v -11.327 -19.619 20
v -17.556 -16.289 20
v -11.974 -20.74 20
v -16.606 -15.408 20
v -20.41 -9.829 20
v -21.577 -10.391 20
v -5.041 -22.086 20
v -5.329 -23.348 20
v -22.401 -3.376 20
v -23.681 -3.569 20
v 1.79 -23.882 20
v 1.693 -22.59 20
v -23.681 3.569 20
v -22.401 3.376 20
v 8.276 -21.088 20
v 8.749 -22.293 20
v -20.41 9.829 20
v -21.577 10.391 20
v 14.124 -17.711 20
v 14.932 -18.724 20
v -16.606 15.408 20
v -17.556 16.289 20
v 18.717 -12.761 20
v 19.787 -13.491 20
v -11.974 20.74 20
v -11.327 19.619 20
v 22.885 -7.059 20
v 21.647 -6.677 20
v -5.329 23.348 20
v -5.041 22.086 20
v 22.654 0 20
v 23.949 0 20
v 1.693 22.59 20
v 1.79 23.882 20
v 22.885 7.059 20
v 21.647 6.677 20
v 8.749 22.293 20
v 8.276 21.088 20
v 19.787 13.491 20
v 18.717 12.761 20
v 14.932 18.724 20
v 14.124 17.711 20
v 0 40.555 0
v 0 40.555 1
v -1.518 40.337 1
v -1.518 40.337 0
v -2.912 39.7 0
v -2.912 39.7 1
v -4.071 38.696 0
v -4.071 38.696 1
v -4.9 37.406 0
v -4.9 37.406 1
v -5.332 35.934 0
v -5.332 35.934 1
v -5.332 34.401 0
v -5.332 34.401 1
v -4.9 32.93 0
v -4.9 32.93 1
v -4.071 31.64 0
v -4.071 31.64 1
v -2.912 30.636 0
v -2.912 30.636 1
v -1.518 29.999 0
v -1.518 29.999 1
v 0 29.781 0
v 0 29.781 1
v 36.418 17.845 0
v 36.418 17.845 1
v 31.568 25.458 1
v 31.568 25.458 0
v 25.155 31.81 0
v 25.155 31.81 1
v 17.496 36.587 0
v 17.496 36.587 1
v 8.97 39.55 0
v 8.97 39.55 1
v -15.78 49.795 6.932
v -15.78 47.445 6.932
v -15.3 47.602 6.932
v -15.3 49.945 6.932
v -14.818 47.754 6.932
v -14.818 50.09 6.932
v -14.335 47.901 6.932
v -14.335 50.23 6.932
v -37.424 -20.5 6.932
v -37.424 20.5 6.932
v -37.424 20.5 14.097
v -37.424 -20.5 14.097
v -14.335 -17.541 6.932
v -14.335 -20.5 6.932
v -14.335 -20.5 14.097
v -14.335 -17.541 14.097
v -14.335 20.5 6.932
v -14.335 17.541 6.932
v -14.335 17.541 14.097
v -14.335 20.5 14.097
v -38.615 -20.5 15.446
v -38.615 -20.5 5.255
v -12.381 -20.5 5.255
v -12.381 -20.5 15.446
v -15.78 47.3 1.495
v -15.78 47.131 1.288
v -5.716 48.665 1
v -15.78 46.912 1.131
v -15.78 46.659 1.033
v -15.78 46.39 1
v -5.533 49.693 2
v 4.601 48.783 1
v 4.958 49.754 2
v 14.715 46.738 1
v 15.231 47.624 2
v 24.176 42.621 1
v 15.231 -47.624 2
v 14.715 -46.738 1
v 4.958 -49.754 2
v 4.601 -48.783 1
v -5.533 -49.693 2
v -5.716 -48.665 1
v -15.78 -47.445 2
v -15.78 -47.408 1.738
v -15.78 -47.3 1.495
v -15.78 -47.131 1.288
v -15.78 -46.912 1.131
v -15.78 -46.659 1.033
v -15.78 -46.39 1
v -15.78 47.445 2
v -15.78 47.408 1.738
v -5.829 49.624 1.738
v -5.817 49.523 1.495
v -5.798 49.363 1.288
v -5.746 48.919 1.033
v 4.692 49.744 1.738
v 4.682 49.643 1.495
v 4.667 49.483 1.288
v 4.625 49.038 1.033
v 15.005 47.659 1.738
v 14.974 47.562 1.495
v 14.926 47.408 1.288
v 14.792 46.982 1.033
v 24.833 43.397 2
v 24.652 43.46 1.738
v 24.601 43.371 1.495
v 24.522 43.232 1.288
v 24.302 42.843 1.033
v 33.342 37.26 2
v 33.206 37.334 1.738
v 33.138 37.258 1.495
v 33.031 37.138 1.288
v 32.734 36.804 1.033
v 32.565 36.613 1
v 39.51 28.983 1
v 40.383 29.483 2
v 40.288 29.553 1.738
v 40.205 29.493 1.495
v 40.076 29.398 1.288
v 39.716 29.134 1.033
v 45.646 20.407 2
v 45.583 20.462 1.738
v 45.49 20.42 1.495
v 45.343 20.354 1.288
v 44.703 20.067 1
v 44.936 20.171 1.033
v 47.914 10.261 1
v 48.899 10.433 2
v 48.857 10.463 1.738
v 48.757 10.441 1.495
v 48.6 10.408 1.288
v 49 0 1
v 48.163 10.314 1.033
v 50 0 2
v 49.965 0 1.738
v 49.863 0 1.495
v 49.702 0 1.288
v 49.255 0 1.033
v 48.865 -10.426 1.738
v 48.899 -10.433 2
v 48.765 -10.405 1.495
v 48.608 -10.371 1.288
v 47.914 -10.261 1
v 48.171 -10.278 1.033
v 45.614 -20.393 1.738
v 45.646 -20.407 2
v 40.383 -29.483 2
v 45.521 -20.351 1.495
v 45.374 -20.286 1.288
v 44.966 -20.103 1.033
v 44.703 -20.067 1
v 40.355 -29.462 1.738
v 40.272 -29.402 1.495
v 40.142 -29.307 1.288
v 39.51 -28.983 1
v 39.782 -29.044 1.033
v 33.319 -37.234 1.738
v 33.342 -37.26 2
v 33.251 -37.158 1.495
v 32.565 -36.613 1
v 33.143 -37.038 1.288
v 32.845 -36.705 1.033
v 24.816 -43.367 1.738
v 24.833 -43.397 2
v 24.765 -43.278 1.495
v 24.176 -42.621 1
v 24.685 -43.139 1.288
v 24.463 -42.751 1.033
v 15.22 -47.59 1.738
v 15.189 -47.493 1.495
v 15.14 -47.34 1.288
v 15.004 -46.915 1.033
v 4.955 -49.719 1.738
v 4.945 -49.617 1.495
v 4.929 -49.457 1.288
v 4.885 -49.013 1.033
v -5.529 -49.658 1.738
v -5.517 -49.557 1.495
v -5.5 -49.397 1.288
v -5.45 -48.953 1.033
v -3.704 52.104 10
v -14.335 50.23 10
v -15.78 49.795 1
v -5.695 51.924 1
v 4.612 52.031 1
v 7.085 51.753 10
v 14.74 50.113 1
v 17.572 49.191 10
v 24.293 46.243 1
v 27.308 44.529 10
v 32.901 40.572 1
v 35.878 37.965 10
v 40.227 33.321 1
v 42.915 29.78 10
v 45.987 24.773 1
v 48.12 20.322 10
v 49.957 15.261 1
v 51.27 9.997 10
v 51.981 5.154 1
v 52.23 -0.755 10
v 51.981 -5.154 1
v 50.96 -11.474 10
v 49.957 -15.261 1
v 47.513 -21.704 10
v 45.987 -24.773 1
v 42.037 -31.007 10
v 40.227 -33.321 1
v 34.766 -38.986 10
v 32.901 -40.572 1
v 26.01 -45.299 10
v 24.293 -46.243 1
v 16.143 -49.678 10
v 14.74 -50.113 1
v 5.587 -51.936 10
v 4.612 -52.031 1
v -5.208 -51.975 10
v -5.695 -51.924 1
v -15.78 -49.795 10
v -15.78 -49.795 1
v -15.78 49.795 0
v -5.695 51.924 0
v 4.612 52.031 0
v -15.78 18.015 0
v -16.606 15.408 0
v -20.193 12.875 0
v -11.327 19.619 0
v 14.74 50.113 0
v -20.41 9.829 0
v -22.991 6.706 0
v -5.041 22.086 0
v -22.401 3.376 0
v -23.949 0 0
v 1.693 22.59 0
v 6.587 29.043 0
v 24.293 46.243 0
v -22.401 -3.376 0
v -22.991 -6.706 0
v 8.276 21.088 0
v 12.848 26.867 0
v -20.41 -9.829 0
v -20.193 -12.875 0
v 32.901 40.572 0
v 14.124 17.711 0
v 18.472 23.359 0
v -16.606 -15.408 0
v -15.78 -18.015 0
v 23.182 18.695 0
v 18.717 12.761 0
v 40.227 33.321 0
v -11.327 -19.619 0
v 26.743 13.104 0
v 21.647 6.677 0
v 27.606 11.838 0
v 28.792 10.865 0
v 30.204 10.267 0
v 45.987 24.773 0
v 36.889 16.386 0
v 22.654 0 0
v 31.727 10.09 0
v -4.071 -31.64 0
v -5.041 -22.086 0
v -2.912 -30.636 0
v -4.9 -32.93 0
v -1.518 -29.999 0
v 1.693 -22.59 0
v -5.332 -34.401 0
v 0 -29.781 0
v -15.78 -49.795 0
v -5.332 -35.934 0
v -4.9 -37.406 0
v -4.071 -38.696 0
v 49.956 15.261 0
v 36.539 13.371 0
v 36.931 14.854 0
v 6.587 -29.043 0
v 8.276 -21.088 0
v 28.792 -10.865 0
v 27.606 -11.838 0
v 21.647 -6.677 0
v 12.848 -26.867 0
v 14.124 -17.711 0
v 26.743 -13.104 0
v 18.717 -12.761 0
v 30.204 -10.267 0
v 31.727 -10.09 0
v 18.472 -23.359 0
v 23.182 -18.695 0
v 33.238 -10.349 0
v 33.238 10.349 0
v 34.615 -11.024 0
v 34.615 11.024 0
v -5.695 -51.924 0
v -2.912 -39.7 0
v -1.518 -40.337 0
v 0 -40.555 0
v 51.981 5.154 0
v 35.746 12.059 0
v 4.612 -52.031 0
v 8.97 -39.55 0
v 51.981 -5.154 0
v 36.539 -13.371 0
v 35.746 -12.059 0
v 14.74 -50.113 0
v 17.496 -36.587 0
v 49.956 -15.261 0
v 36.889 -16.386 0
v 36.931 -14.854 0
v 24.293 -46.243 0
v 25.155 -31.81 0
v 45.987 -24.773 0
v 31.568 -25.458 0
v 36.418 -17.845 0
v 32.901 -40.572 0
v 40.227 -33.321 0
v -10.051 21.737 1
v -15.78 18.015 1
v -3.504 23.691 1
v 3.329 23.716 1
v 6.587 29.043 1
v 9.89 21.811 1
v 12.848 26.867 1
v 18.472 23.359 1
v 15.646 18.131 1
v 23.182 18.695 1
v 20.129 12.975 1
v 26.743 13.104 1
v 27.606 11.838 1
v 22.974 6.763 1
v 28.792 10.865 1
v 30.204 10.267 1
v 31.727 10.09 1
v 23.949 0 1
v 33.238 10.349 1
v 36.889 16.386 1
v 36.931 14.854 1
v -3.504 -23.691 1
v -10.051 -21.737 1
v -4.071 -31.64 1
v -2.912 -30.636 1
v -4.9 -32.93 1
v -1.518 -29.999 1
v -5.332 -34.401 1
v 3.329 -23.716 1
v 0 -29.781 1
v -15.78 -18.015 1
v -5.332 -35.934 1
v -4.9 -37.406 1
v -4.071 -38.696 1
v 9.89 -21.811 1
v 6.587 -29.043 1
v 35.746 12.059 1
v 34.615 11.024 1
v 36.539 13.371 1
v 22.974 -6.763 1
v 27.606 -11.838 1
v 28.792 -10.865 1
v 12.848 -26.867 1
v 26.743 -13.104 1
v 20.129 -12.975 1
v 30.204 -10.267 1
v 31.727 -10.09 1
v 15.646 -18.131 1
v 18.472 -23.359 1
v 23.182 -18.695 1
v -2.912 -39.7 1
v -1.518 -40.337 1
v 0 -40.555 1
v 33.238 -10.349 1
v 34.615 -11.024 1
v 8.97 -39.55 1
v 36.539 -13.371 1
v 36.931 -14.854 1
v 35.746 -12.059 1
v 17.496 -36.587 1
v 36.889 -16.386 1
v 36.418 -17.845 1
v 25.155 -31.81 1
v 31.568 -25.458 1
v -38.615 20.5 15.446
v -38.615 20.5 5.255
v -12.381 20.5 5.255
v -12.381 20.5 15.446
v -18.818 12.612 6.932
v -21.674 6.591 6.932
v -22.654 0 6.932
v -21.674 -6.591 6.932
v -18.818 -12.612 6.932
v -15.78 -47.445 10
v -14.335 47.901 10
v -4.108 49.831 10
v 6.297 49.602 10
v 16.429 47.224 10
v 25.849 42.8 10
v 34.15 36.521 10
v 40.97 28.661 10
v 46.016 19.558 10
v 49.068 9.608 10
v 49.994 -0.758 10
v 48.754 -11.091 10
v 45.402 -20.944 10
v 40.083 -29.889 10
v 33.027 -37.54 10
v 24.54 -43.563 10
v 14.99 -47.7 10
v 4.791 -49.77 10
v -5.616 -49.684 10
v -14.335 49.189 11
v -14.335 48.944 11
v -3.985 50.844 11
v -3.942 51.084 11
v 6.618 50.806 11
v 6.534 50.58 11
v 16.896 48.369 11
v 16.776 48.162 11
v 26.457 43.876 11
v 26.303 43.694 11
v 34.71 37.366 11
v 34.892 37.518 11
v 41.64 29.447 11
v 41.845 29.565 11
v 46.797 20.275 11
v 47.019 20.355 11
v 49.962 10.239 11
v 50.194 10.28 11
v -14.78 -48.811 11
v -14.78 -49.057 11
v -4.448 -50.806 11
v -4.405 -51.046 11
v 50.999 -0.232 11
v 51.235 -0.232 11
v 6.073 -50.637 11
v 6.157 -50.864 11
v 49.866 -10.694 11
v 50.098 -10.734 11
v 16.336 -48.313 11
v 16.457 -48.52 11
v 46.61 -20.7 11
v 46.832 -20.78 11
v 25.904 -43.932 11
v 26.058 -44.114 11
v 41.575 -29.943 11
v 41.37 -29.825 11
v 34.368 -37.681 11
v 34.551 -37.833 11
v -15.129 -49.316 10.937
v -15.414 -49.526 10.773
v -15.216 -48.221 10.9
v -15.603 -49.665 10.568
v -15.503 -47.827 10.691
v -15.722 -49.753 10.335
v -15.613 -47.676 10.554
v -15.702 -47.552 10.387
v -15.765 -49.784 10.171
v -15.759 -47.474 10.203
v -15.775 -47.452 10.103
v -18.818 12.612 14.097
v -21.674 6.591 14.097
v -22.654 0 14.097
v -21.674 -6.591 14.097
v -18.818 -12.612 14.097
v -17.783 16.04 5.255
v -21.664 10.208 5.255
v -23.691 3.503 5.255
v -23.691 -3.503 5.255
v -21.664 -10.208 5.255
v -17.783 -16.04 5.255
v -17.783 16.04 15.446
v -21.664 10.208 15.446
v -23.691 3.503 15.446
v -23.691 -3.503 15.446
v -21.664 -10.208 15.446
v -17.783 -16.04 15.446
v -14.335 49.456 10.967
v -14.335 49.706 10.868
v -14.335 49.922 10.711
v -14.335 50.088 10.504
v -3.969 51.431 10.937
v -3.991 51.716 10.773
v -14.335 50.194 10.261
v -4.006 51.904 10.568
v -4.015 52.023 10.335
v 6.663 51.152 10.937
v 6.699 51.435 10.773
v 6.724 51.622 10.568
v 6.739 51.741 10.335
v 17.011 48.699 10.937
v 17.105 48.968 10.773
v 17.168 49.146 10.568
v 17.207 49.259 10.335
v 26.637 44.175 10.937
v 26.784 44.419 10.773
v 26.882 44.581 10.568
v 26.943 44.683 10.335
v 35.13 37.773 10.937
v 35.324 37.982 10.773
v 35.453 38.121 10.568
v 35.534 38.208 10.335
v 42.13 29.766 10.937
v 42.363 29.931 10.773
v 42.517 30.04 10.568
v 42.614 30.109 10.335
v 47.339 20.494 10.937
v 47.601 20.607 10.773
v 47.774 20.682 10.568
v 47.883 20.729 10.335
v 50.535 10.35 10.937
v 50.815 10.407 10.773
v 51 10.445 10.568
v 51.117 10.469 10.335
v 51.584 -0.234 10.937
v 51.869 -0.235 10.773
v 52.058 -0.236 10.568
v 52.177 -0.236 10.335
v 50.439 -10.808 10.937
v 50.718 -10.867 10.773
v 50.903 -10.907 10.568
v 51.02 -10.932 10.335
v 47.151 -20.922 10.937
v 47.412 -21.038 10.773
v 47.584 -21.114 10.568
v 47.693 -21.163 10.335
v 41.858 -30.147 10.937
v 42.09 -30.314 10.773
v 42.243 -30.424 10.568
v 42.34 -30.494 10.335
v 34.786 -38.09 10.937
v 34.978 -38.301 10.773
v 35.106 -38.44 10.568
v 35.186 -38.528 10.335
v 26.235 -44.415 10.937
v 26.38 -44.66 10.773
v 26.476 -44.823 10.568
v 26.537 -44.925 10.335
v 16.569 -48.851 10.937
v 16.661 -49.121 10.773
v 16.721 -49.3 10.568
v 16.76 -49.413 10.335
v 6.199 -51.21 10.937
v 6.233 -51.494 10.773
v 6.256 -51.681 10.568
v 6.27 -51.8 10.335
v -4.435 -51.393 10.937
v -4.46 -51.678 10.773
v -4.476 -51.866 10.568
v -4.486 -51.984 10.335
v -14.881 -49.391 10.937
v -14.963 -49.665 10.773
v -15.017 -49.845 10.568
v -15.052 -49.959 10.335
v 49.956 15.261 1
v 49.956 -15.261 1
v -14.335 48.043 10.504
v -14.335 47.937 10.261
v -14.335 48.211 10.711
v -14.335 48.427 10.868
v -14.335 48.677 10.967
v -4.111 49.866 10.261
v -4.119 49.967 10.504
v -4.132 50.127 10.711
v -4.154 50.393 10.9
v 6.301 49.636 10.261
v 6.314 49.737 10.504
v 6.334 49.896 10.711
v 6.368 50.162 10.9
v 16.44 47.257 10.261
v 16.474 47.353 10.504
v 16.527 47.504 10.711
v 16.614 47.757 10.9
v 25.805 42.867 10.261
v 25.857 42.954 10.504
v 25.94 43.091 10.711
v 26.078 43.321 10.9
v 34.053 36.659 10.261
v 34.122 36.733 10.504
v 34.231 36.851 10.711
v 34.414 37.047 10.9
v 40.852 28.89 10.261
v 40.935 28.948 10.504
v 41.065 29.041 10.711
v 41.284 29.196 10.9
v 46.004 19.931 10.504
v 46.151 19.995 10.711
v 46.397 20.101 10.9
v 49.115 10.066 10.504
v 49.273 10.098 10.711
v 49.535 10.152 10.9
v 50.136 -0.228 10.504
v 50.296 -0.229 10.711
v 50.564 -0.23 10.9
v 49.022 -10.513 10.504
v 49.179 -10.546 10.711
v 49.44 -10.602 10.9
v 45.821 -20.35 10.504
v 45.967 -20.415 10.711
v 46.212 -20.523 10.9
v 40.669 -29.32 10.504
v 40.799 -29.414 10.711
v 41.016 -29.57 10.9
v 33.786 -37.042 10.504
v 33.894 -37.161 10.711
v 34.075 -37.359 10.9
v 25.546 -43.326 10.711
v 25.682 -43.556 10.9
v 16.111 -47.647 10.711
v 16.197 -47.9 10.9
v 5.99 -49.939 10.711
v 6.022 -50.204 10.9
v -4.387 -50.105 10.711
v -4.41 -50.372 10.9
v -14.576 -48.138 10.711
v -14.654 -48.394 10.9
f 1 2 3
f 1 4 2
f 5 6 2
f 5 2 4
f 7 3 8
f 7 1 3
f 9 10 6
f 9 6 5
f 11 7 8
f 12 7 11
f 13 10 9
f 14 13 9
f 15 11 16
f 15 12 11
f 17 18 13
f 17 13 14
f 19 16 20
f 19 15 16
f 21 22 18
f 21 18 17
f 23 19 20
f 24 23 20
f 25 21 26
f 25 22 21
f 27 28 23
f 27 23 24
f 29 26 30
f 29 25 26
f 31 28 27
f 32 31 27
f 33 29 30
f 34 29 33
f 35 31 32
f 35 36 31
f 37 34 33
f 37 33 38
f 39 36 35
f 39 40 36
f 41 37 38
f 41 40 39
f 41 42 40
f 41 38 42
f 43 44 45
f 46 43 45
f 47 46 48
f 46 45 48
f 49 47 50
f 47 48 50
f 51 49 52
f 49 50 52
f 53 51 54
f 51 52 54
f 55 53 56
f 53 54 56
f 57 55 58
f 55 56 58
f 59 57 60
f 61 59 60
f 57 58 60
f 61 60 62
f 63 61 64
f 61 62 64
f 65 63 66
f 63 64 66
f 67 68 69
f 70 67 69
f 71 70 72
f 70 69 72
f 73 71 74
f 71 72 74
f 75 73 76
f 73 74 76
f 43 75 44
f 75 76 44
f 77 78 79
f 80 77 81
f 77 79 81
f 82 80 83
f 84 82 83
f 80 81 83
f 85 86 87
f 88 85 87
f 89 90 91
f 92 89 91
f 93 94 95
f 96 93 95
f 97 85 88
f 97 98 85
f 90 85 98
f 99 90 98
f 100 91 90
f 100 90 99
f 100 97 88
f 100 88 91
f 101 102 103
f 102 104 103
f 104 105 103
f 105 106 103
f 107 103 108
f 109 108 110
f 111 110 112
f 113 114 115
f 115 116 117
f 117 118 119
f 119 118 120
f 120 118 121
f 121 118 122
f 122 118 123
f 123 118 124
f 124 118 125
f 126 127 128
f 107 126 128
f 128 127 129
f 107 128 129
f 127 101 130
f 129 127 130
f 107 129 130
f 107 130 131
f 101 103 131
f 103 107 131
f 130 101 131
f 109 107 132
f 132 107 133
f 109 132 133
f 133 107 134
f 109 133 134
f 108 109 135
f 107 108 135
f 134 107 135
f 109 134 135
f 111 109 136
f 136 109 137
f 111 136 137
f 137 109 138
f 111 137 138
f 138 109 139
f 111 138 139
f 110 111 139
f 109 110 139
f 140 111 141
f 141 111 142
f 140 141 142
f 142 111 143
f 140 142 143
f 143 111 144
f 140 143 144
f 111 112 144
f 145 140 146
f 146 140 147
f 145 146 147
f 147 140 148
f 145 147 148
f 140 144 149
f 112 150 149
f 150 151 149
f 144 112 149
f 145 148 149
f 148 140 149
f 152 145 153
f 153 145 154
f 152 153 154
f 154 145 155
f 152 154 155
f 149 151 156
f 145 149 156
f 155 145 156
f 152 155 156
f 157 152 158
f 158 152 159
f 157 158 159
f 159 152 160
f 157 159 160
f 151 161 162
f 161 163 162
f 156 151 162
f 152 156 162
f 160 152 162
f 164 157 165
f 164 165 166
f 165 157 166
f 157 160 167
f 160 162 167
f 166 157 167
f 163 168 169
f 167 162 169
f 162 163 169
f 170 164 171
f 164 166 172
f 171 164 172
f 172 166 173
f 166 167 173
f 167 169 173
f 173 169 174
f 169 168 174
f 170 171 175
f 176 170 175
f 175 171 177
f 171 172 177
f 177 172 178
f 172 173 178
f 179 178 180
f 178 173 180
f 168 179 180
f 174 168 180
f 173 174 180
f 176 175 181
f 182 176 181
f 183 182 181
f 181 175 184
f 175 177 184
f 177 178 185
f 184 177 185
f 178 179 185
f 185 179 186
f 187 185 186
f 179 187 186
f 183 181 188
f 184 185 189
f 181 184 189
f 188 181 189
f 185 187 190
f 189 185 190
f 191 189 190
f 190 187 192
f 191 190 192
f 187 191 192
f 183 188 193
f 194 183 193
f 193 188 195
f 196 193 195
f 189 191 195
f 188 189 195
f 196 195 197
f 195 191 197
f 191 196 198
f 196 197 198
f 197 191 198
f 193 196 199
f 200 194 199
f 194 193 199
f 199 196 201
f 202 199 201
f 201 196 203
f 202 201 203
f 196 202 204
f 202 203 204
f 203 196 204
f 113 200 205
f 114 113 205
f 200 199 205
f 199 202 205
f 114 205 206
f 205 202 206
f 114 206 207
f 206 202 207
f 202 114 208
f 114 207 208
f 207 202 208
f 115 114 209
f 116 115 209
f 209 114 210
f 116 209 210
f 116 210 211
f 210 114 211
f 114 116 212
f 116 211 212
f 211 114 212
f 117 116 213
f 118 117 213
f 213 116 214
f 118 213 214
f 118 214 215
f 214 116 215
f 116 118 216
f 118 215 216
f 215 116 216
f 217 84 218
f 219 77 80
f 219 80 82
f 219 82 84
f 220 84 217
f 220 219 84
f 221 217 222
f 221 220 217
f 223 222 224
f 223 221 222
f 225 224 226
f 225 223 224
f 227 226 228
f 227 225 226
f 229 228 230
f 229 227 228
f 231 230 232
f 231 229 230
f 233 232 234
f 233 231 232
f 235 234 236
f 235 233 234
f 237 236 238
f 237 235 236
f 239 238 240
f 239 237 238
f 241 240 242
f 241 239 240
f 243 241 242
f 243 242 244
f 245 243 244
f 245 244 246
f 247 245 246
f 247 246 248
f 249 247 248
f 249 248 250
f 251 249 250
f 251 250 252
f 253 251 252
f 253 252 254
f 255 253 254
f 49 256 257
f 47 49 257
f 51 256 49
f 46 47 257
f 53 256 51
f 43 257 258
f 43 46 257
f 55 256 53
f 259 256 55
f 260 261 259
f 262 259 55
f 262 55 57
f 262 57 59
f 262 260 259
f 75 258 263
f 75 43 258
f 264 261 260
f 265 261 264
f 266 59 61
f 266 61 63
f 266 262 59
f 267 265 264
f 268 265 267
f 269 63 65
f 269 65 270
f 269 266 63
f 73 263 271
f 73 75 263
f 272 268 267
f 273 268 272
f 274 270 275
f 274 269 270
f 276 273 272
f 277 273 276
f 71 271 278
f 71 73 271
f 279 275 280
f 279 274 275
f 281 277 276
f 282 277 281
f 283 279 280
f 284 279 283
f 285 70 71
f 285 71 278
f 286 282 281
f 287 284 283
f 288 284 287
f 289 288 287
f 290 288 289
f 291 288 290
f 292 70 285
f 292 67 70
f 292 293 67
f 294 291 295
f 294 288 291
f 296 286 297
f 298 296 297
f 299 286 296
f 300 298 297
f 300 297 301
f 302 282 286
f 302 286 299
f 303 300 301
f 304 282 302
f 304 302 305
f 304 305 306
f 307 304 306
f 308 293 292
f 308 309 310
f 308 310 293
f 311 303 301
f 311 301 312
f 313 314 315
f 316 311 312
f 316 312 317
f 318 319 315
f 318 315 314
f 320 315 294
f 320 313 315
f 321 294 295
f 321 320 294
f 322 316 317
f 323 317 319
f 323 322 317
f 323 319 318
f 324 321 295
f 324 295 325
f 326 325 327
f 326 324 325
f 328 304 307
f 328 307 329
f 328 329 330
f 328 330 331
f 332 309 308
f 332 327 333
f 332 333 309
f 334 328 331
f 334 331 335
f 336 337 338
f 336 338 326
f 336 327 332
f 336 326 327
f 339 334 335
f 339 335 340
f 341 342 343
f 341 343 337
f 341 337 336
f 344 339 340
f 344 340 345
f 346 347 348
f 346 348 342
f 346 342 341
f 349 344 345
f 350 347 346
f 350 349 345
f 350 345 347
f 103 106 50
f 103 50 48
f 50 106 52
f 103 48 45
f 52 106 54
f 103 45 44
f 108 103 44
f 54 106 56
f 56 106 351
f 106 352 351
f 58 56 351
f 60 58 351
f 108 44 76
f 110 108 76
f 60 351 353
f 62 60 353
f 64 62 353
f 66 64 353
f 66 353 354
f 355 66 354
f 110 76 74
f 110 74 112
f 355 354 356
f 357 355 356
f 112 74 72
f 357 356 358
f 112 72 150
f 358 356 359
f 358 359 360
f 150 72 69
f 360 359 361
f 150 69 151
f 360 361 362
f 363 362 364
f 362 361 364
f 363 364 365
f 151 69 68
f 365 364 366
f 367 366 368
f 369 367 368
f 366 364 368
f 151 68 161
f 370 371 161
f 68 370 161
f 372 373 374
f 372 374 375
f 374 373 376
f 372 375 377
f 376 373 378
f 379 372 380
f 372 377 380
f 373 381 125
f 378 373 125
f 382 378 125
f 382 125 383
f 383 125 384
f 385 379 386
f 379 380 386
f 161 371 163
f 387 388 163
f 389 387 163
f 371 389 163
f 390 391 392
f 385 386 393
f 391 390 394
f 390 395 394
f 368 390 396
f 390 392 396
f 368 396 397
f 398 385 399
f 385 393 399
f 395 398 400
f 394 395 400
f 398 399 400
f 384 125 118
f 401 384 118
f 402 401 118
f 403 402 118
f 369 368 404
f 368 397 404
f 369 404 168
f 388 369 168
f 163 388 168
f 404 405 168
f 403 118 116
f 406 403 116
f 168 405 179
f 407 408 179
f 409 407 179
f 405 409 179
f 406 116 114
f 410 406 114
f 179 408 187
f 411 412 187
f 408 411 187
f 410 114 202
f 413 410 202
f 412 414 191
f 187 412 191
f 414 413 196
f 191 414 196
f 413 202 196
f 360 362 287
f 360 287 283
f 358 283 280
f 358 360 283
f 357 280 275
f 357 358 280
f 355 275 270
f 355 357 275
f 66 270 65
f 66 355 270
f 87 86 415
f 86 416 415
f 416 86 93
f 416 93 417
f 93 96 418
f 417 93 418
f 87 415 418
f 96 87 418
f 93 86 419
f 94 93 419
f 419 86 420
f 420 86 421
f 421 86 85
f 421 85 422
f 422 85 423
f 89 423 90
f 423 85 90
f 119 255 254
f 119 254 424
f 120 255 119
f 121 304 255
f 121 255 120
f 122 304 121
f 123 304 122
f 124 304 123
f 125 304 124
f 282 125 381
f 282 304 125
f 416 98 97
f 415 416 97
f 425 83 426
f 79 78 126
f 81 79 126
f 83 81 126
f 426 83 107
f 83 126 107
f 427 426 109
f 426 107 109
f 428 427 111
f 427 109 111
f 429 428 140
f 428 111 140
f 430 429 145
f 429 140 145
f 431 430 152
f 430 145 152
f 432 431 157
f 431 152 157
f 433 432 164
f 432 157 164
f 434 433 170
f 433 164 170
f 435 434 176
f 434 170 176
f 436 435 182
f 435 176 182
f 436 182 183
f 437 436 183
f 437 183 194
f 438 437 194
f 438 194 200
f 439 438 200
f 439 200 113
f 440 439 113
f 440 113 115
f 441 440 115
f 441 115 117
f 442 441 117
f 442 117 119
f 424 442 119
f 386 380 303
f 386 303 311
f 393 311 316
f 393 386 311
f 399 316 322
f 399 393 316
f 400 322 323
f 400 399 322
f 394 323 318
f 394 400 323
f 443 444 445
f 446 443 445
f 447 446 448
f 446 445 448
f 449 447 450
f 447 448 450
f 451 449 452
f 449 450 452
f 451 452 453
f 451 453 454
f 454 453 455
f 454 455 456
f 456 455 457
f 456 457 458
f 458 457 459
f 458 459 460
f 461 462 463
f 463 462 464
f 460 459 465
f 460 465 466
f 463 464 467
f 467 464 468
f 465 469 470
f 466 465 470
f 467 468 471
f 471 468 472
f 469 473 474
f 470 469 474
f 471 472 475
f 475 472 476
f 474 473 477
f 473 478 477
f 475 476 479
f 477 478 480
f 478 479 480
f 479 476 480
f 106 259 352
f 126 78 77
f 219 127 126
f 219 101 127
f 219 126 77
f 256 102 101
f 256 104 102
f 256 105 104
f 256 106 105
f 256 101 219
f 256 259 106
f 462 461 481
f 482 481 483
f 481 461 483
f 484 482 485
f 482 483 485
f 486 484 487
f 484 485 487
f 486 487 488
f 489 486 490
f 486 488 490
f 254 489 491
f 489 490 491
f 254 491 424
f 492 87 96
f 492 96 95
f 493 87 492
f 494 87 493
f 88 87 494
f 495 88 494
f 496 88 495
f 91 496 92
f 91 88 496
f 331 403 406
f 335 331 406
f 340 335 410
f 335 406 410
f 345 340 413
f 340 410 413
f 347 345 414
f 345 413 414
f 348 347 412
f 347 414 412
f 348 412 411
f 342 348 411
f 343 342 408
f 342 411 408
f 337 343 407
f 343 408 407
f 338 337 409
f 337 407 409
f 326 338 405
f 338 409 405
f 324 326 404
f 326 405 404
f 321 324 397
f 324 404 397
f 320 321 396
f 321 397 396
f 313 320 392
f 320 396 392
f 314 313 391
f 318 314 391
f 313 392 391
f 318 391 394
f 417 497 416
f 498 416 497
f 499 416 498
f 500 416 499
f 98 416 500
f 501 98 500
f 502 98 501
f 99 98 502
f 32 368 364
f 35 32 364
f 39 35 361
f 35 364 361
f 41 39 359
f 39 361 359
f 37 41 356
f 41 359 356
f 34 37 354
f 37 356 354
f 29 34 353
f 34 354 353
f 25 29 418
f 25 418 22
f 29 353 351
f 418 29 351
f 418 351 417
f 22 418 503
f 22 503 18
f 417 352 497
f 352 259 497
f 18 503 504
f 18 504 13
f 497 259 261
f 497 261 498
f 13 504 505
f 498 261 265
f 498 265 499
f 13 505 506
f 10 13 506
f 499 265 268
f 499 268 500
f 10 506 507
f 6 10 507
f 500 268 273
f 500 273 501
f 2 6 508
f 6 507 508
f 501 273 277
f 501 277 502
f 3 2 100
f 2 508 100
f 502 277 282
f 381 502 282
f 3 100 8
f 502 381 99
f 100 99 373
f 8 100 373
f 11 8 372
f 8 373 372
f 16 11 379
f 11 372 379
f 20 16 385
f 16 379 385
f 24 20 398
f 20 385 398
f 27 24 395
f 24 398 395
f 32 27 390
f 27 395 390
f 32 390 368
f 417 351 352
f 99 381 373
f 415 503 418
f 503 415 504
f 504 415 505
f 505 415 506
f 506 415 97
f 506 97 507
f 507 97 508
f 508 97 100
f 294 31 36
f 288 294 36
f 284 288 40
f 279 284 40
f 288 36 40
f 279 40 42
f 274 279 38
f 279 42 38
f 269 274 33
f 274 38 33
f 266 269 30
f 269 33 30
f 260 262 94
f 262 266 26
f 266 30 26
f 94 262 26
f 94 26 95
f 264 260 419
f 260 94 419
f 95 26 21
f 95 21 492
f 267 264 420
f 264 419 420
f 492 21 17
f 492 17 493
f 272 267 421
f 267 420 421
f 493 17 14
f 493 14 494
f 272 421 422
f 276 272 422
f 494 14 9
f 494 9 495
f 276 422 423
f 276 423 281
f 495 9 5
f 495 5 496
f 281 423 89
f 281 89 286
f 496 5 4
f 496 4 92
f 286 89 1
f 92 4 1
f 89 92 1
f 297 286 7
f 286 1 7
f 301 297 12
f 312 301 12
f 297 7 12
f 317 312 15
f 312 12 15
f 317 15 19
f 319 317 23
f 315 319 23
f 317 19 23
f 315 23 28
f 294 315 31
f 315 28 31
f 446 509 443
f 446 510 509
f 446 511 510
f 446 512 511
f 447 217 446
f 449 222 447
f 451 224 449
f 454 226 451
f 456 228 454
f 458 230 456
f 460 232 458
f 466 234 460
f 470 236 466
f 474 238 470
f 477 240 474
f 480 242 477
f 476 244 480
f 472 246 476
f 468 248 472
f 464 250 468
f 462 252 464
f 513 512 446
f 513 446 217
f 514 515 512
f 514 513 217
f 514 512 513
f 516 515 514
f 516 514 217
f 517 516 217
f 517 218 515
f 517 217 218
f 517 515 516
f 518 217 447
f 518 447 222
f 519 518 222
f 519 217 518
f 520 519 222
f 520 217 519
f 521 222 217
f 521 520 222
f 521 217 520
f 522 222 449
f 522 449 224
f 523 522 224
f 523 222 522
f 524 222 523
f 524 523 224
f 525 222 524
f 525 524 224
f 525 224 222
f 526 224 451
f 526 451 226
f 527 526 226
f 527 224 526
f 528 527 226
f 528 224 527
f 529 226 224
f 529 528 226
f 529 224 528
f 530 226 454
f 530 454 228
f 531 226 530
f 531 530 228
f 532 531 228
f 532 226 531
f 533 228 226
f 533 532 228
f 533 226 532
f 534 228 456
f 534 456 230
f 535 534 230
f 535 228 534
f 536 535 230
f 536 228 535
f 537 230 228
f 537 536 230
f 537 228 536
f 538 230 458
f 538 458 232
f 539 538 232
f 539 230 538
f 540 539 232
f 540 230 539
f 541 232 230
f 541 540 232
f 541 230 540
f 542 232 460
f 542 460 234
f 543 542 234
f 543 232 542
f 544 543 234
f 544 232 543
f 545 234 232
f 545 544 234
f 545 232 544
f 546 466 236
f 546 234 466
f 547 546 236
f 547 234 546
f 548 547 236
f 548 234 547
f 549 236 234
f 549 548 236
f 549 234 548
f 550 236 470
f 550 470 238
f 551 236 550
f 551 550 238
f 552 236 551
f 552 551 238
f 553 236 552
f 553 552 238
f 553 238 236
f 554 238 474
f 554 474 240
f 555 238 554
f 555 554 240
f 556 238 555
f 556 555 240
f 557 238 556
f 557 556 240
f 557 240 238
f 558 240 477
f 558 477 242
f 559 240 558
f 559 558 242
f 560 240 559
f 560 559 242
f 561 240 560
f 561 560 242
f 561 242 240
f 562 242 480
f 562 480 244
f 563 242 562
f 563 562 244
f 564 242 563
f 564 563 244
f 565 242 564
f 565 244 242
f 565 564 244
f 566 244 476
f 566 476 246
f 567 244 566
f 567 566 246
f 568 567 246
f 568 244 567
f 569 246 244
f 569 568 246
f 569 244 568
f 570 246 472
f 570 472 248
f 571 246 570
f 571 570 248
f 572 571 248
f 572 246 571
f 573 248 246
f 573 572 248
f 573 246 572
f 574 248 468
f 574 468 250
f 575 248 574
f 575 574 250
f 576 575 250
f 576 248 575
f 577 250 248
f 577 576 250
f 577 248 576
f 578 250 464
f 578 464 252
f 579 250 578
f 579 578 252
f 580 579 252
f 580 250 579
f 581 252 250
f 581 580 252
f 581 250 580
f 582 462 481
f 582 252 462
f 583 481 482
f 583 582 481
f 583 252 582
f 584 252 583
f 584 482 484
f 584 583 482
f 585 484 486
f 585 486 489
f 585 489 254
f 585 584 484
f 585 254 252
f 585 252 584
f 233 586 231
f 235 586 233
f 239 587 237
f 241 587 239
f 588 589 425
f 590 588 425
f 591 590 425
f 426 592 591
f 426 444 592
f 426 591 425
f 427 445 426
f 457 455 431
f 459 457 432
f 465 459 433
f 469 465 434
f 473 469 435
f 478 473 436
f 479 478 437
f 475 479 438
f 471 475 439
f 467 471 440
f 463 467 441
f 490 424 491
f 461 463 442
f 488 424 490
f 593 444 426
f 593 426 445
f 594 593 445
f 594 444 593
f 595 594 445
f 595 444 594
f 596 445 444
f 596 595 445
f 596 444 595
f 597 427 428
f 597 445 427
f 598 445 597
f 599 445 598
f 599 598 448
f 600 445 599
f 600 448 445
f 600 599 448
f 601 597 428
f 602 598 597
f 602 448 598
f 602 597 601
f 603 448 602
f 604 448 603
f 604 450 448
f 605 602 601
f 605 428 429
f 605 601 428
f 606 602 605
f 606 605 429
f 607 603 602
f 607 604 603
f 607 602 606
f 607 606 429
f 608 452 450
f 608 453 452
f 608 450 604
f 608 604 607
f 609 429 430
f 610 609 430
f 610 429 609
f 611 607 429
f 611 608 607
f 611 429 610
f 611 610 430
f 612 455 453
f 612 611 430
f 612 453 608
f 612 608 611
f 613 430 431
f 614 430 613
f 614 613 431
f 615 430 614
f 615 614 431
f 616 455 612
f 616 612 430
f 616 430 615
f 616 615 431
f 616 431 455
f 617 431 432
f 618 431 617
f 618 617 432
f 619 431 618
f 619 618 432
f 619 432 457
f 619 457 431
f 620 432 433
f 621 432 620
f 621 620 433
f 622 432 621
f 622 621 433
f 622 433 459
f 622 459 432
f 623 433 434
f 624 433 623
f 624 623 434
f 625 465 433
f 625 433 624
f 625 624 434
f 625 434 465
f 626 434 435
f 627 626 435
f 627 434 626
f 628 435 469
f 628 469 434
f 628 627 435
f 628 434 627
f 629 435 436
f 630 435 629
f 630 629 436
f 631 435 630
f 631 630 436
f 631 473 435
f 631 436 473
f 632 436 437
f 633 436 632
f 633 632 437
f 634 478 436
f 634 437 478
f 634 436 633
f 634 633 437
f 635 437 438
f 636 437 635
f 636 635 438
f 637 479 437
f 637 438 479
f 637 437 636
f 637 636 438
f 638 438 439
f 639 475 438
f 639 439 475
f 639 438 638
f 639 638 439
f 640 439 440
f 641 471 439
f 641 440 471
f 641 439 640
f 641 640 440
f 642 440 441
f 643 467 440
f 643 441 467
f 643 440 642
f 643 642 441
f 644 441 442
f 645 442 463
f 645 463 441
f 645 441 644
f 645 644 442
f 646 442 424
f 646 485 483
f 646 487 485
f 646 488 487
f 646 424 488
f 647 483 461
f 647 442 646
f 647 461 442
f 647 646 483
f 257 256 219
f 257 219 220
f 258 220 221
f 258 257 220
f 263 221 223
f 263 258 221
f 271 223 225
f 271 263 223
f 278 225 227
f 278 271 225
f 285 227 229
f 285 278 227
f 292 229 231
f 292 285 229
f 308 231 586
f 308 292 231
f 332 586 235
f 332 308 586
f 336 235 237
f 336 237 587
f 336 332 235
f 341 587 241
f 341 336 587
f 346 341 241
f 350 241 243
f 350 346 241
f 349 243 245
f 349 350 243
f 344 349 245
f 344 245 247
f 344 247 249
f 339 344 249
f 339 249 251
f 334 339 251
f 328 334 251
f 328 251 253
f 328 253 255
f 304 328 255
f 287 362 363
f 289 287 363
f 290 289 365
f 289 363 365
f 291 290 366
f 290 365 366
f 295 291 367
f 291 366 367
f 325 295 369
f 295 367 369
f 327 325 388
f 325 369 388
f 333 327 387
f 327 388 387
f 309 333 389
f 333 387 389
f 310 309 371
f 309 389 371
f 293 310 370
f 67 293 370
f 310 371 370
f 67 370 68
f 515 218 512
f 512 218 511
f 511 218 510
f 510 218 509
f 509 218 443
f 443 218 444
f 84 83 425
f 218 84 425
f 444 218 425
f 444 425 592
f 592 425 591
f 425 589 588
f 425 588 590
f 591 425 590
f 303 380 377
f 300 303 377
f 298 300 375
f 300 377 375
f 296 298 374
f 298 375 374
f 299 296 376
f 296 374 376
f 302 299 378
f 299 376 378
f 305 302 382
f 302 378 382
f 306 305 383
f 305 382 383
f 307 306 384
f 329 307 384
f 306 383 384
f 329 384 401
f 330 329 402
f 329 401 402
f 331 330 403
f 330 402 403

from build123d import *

# Parameters (mm, degrees)
SKETCH_R        = 23.948567
PAD_DEPTH       = 20
SKETCH001_W     = 28.280895
SKETCH001_H     = 10.191083
PAD001_DEPTH    = 20.5
PAD002_DEPTH    = 1
PAD003_DEPTH    = 10
FILLET_R        = 1
FILLET001_R     = 1
SKETCH005_W     = 23.089169
SKETCH005_H     = 7.165605
POCKET_DEPTH    = 72.73646
SKETCH006_R     = 22.653648
POCKET001_DEPTH = 20.001
POCKET002_DEPTH = 5


with BuildPart() as part:
    # Sketch → Pad (new body)
    with BuildSketch(Plane.XY):
        Circle(SKETCH_R)
    extrude(amount=PAD_DEPTH)

    # Sketch001 → Pad001 (join, symmetric)
    with BuildSketch(Plane.XZ):
        with Locations((-24.474199, 10.350326)):
            Rectangle(SKETCH001_W, SKETCH001_H)
    extrude(amount=PAD001_DEPTH, both=True)

    # Sketch002 (on Face2 of Pad001) → Pad002 (join)
    with BuildSketch(Plane(origin=(0, 0, 0), x_dir=(1, 0, 0), z_dir=(0, 0, -1))):
        with BuildLine():
            ThreePointArc((-15.78, -49.794891), (52.235424, 0), (-15.78, 49.794891))
            Line((-15.78, 49.794891), (-15.78, -49.794891))
        make_face()
    extrude(amount=-PAD002_DEPTH)

    # Sketch004 (on Face2 of Pad001) → Pad003 (join)
    with BuildSketch(Plane(origin=(0, 0, 1), x_dir=(1, 0, 0), z_dir=(0, 0, -1))):
        with BuildLine():
            ThreePointArc((-15.78, -49.794928), (52.23546, 0), (-15.78, 49.794928))
            Line((-15.78, 49.794928), (-15.78, 47.444616))
            ThreePointArc((-15.78, -47.444616), (50, 0), (-15.78, 47.444616))
            Line((-15.78, -47.444616), (-15.78, -49.794928))
        make_face()
    extrude(amount=-PAD003_DEPTH)

    # Fillet
    fillet_edges = [part.edges().sort_by_distance(p)[0] for p in [
        (50, 0, 1),
    ]]
    fillet(fillet_edges, radius=FILLET_R)

    # Fillet001
    fillet001_edges = [part.edges().sort_by_distance(p)[0] for p in [
        (52.23546, 0, 11),
        (-15.78, -48.619772, 11),
        (50, 0, 11),
        (-15.78, 48.619772, 11),
    ]]
    fillet(fillet001_edges, radius=FILLET001_R)

    # Sketch005 (on Face15 of Fillet001) → Pocket (cut, through all)
    with BuildSketch(Plane.XZ.offset(20.5)):
        with Locations((-25.879338, 10.514653)):
            Rectangle(SKETCH005_W, SKETCH005_H)
    extrude(amount=-POCKET_DEPTH, mode=Mode.SUBTRACT)

    # Sketch006 (on Face16 of Pocket) → Pocket001 (cut, through all)
    with BuildSketch(Plane.XY.offset(20)):
        Circle(SKETCH006_R)
    extrude(amount=-POCKET001_DEPTH, mode=Mode.SUBTRACT)

    # Sketch007 (on Face6 of Pocket001) → Pocket002 (cut)
    with BuildSketch(Plane.XY.offset(1)):
        with BuildLine():
            ThreePointArc((0, 40.554842), (-5.38709, 35.167753), (0, 29.780663))
            ThreePointArc((26.742534, 13.104381), (15.758026, 25.269993), (0, 29.780663))
            ThreePointArc((26.742534, 13.104381), (33.950529, 10.637346), (36.417565, 17.845341))
            ThreePointArc((36.417565, 17.845341), (21.459033, 34.412281), (0, 40.554842))
        make_face()
        with BuildLine():
            ThreePointArc((0, -29.780663), (-5.38709, -35.167753), (0, -40.554842))
            ThreePointArc((0, -40.554842), (21.459033, -34.412281), (36.417565, -17.845341))
            ThreePointArc((36.417565, -17.845341), (33.950529, -10.637346), (26.742534, -13.104381))
            ThreePointArc((0, -29.780663), (15.758026, -25.269993), (26.742534, -13.104381))
        make_face()
    extrude(amount=-POCKET002_DEPTH, mode=Mode.SUBTRACT)


solid = part.part
